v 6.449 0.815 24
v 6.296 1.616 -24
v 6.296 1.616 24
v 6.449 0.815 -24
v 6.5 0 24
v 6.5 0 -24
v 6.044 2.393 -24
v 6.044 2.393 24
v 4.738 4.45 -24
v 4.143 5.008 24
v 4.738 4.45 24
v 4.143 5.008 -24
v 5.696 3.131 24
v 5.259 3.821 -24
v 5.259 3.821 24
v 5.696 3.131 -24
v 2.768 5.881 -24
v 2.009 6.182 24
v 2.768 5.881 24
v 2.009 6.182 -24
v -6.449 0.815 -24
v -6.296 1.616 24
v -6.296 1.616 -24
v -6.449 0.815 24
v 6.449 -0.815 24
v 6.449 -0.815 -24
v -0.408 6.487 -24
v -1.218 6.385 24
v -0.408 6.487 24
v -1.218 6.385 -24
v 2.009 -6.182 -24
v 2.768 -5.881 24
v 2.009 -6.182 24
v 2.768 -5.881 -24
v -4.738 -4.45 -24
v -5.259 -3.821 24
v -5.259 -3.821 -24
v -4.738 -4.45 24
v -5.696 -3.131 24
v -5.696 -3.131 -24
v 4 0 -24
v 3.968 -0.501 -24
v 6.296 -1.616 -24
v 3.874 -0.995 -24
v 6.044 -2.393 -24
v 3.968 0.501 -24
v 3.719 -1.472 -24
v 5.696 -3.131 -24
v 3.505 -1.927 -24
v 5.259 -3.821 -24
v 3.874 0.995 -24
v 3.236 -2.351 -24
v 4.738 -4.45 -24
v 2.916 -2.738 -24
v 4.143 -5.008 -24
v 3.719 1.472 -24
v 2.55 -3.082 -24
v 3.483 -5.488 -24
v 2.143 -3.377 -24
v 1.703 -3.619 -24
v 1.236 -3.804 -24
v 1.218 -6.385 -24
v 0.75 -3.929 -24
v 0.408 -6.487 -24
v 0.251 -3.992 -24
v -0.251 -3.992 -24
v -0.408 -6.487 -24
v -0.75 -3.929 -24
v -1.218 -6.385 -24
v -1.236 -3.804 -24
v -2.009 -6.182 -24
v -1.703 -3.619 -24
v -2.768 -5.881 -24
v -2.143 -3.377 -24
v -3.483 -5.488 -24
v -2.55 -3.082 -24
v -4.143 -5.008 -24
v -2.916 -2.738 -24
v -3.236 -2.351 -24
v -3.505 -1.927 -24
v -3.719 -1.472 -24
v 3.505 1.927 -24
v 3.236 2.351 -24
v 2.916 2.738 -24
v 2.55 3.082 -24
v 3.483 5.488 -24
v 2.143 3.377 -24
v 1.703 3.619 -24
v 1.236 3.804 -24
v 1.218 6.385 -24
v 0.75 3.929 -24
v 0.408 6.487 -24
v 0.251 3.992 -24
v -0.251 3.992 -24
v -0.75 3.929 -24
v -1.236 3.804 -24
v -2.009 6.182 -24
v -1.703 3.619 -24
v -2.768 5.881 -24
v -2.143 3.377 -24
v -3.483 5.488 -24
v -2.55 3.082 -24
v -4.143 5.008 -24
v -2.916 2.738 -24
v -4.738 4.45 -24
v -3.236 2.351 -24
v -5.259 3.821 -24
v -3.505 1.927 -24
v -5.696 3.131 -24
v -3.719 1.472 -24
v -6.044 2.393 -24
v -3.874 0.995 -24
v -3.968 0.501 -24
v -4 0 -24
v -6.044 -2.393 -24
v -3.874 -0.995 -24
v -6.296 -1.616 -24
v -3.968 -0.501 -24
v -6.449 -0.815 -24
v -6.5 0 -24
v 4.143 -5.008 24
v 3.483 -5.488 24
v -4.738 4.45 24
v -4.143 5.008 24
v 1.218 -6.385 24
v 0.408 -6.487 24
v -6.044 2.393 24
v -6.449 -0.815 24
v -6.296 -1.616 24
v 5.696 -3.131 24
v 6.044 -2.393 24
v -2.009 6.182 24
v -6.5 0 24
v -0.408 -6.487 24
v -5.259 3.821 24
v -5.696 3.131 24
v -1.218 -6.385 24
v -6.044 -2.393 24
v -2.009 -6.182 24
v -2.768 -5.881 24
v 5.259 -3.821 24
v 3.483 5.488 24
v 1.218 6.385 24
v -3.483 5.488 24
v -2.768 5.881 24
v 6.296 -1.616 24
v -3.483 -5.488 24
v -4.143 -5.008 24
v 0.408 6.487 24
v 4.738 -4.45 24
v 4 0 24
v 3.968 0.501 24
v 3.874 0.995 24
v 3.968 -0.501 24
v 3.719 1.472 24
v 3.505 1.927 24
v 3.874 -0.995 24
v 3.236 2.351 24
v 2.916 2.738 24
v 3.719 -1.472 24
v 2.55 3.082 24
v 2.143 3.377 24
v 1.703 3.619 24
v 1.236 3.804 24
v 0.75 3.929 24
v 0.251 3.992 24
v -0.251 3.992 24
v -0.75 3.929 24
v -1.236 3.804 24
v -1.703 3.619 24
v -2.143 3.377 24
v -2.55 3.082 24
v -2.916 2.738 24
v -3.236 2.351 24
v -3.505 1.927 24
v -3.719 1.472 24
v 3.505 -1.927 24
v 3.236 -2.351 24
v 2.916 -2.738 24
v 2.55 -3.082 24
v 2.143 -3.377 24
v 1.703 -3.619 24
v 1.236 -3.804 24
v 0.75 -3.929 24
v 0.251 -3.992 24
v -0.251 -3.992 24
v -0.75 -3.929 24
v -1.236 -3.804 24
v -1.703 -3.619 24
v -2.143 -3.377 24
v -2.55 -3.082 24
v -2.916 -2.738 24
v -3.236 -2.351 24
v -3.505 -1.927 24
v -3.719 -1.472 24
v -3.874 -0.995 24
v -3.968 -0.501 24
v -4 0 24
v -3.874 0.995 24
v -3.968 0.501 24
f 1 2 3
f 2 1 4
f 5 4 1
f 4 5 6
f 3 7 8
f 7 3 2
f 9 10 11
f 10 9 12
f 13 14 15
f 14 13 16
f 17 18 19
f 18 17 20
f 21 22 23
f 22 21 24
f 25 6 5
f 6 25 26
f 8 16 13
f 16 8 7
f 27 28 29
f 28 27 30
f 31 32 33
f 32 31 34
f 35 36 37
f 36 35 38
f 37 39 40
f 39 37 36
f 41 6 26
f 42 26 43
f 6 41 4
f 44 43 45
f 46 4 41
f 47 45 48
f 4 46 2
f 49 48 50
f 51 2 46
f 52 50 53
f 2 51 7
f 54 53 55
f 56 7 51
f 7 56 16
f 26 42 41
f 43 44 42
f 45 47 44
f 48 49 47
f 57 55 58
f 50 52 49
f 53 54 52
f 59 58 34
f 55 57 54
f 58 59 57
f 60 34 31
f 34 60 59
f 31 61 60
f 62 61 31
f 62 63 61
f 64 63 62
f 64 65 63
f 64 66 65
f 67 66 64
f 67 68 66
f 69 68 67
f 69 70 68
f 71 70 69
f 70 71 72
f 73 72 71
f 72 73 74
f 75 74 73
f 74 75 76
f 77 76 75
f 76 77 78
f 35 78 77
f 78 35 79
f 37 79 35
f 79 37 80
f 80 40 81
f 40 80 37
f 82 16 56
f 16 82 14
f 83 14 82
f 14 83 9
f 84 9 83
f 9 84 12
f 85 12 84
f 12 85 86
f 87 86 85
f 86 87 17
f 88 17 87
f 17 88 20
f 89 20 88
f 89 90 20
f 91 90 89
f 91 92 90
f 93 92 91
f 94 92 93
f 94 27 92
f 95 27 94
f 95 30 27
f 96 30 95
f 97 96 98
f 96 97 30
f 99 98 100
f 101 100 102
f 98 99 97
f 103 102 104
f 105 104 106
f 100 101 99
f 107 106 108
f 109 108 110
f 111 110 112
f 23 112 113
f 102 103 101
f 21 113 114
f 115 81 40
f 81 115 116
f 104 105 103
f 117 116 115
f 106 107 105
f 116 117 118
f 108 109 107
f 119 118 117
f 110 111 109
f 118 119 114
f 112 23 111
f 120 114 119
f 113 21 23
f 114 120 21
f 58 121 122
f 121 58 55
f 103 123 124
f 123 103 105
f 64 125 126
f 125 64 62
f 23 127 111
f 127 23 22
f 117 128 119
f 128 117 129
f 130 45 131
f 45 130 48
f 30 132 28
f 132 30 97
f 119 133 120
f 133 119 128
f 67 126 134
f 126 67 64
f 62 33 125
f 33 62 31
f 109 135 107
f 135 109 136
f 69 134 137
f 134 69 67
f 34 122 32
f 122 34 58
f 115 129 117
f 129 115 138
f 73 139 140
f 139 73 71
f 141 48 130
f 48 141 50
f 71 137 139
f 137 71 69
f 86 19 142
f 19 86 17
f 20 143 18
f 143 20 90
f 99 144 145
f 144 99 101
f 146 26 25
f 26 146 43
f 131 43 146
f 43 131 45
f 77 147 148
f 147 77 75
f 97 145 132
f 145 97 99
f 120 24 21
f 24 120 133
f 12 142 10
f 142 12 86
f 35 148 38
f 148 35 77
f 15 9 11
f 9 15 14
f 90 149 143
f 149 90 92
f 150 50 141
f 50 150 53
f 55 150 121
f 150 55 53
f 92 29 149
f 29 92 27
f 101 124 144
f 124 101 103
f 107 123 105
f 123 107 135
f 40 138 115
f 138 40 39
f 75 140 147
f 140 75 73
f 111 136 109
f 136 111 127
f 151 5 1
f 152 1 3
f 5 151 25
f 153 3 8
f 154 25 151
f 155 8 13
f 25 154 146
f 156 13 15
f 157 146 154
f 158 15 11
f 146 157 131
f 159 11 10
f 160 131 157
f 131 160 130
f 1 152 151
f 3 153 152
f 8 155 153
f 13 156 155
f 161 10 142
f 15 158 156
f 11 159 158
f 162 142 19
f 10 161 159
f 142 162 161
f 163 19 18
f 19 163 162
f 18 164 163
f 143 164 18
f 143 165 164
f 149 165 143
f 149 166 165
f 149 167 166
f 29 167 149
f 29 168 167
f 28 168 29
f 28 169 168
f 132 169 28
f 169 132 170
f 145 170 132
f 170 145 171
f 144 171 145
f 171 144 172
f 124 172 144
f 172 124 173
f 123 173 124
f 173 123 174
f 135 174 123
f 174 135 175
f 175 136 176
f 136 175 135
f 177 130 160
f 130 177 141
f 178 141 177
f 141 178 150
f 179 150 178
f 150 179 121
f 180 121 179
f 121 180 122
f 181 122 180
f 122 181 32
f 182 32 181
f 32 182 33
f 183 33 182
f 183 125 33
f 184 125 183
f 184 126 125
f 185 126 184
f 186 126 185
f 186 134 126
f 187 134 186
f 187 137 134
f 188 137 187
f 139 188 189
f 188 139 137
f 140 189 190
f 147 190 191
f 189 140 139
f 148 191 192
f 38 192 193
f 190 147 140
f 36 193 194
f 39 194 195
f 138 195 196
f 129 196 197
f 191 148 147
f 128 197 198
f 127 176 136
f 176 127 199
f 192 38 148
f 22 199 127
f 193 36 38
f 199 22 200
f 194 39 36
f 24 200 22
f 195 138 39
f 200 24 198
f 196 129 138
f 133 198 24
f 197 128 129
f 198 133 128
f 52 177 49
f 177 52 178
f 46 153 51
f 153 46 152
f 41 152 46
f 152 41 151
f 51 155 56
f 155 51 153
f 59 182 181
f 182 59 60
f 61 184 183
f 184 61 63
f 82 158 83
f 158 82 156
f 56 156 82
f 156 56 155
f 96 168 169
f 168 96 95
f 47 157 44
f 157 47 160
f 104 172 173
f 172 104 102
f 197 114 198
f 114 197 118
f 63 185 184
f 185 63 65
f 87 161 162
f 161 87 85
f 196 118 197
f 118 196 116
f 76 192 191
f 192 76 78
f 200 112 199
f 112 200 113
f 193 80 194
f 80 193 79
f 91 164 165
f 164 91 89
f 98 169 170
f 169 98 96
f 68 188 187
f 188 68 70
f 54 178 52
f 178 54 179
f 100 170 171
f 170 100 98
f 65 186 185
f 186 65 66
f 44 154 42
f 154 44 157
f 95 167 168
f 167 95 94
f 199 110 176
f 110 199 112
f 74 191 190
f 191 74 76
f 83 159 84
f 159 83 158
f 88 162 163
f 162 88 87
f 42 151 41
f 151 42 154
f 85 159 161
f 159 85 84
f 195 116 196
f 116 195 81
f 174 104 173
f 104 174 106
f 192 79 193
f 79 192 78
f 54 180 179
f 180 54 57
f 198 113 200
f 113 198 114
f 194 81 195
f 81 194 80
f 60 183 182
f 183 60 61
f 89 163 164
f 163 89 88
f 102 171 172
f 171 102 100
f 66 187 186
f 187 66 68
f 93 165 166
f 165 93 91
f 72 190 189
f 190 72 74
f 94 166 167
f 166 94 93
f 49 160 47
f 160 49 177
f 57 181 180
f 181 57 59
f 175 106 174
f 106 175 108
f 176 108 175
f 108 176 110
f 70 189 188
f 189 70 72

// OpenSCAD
$fn = 50;


difference() {
	union() {
		translate(v = [0, 0, -24.0000000000]) {
			cylinder(h = 48, r = 6.5000000000);
		}
	}
	union() {
		translate(v = [0, 0, -100.0000000000]) {
			cylinder(h = 200, r = 4.0000000000);
		}
	}
}
